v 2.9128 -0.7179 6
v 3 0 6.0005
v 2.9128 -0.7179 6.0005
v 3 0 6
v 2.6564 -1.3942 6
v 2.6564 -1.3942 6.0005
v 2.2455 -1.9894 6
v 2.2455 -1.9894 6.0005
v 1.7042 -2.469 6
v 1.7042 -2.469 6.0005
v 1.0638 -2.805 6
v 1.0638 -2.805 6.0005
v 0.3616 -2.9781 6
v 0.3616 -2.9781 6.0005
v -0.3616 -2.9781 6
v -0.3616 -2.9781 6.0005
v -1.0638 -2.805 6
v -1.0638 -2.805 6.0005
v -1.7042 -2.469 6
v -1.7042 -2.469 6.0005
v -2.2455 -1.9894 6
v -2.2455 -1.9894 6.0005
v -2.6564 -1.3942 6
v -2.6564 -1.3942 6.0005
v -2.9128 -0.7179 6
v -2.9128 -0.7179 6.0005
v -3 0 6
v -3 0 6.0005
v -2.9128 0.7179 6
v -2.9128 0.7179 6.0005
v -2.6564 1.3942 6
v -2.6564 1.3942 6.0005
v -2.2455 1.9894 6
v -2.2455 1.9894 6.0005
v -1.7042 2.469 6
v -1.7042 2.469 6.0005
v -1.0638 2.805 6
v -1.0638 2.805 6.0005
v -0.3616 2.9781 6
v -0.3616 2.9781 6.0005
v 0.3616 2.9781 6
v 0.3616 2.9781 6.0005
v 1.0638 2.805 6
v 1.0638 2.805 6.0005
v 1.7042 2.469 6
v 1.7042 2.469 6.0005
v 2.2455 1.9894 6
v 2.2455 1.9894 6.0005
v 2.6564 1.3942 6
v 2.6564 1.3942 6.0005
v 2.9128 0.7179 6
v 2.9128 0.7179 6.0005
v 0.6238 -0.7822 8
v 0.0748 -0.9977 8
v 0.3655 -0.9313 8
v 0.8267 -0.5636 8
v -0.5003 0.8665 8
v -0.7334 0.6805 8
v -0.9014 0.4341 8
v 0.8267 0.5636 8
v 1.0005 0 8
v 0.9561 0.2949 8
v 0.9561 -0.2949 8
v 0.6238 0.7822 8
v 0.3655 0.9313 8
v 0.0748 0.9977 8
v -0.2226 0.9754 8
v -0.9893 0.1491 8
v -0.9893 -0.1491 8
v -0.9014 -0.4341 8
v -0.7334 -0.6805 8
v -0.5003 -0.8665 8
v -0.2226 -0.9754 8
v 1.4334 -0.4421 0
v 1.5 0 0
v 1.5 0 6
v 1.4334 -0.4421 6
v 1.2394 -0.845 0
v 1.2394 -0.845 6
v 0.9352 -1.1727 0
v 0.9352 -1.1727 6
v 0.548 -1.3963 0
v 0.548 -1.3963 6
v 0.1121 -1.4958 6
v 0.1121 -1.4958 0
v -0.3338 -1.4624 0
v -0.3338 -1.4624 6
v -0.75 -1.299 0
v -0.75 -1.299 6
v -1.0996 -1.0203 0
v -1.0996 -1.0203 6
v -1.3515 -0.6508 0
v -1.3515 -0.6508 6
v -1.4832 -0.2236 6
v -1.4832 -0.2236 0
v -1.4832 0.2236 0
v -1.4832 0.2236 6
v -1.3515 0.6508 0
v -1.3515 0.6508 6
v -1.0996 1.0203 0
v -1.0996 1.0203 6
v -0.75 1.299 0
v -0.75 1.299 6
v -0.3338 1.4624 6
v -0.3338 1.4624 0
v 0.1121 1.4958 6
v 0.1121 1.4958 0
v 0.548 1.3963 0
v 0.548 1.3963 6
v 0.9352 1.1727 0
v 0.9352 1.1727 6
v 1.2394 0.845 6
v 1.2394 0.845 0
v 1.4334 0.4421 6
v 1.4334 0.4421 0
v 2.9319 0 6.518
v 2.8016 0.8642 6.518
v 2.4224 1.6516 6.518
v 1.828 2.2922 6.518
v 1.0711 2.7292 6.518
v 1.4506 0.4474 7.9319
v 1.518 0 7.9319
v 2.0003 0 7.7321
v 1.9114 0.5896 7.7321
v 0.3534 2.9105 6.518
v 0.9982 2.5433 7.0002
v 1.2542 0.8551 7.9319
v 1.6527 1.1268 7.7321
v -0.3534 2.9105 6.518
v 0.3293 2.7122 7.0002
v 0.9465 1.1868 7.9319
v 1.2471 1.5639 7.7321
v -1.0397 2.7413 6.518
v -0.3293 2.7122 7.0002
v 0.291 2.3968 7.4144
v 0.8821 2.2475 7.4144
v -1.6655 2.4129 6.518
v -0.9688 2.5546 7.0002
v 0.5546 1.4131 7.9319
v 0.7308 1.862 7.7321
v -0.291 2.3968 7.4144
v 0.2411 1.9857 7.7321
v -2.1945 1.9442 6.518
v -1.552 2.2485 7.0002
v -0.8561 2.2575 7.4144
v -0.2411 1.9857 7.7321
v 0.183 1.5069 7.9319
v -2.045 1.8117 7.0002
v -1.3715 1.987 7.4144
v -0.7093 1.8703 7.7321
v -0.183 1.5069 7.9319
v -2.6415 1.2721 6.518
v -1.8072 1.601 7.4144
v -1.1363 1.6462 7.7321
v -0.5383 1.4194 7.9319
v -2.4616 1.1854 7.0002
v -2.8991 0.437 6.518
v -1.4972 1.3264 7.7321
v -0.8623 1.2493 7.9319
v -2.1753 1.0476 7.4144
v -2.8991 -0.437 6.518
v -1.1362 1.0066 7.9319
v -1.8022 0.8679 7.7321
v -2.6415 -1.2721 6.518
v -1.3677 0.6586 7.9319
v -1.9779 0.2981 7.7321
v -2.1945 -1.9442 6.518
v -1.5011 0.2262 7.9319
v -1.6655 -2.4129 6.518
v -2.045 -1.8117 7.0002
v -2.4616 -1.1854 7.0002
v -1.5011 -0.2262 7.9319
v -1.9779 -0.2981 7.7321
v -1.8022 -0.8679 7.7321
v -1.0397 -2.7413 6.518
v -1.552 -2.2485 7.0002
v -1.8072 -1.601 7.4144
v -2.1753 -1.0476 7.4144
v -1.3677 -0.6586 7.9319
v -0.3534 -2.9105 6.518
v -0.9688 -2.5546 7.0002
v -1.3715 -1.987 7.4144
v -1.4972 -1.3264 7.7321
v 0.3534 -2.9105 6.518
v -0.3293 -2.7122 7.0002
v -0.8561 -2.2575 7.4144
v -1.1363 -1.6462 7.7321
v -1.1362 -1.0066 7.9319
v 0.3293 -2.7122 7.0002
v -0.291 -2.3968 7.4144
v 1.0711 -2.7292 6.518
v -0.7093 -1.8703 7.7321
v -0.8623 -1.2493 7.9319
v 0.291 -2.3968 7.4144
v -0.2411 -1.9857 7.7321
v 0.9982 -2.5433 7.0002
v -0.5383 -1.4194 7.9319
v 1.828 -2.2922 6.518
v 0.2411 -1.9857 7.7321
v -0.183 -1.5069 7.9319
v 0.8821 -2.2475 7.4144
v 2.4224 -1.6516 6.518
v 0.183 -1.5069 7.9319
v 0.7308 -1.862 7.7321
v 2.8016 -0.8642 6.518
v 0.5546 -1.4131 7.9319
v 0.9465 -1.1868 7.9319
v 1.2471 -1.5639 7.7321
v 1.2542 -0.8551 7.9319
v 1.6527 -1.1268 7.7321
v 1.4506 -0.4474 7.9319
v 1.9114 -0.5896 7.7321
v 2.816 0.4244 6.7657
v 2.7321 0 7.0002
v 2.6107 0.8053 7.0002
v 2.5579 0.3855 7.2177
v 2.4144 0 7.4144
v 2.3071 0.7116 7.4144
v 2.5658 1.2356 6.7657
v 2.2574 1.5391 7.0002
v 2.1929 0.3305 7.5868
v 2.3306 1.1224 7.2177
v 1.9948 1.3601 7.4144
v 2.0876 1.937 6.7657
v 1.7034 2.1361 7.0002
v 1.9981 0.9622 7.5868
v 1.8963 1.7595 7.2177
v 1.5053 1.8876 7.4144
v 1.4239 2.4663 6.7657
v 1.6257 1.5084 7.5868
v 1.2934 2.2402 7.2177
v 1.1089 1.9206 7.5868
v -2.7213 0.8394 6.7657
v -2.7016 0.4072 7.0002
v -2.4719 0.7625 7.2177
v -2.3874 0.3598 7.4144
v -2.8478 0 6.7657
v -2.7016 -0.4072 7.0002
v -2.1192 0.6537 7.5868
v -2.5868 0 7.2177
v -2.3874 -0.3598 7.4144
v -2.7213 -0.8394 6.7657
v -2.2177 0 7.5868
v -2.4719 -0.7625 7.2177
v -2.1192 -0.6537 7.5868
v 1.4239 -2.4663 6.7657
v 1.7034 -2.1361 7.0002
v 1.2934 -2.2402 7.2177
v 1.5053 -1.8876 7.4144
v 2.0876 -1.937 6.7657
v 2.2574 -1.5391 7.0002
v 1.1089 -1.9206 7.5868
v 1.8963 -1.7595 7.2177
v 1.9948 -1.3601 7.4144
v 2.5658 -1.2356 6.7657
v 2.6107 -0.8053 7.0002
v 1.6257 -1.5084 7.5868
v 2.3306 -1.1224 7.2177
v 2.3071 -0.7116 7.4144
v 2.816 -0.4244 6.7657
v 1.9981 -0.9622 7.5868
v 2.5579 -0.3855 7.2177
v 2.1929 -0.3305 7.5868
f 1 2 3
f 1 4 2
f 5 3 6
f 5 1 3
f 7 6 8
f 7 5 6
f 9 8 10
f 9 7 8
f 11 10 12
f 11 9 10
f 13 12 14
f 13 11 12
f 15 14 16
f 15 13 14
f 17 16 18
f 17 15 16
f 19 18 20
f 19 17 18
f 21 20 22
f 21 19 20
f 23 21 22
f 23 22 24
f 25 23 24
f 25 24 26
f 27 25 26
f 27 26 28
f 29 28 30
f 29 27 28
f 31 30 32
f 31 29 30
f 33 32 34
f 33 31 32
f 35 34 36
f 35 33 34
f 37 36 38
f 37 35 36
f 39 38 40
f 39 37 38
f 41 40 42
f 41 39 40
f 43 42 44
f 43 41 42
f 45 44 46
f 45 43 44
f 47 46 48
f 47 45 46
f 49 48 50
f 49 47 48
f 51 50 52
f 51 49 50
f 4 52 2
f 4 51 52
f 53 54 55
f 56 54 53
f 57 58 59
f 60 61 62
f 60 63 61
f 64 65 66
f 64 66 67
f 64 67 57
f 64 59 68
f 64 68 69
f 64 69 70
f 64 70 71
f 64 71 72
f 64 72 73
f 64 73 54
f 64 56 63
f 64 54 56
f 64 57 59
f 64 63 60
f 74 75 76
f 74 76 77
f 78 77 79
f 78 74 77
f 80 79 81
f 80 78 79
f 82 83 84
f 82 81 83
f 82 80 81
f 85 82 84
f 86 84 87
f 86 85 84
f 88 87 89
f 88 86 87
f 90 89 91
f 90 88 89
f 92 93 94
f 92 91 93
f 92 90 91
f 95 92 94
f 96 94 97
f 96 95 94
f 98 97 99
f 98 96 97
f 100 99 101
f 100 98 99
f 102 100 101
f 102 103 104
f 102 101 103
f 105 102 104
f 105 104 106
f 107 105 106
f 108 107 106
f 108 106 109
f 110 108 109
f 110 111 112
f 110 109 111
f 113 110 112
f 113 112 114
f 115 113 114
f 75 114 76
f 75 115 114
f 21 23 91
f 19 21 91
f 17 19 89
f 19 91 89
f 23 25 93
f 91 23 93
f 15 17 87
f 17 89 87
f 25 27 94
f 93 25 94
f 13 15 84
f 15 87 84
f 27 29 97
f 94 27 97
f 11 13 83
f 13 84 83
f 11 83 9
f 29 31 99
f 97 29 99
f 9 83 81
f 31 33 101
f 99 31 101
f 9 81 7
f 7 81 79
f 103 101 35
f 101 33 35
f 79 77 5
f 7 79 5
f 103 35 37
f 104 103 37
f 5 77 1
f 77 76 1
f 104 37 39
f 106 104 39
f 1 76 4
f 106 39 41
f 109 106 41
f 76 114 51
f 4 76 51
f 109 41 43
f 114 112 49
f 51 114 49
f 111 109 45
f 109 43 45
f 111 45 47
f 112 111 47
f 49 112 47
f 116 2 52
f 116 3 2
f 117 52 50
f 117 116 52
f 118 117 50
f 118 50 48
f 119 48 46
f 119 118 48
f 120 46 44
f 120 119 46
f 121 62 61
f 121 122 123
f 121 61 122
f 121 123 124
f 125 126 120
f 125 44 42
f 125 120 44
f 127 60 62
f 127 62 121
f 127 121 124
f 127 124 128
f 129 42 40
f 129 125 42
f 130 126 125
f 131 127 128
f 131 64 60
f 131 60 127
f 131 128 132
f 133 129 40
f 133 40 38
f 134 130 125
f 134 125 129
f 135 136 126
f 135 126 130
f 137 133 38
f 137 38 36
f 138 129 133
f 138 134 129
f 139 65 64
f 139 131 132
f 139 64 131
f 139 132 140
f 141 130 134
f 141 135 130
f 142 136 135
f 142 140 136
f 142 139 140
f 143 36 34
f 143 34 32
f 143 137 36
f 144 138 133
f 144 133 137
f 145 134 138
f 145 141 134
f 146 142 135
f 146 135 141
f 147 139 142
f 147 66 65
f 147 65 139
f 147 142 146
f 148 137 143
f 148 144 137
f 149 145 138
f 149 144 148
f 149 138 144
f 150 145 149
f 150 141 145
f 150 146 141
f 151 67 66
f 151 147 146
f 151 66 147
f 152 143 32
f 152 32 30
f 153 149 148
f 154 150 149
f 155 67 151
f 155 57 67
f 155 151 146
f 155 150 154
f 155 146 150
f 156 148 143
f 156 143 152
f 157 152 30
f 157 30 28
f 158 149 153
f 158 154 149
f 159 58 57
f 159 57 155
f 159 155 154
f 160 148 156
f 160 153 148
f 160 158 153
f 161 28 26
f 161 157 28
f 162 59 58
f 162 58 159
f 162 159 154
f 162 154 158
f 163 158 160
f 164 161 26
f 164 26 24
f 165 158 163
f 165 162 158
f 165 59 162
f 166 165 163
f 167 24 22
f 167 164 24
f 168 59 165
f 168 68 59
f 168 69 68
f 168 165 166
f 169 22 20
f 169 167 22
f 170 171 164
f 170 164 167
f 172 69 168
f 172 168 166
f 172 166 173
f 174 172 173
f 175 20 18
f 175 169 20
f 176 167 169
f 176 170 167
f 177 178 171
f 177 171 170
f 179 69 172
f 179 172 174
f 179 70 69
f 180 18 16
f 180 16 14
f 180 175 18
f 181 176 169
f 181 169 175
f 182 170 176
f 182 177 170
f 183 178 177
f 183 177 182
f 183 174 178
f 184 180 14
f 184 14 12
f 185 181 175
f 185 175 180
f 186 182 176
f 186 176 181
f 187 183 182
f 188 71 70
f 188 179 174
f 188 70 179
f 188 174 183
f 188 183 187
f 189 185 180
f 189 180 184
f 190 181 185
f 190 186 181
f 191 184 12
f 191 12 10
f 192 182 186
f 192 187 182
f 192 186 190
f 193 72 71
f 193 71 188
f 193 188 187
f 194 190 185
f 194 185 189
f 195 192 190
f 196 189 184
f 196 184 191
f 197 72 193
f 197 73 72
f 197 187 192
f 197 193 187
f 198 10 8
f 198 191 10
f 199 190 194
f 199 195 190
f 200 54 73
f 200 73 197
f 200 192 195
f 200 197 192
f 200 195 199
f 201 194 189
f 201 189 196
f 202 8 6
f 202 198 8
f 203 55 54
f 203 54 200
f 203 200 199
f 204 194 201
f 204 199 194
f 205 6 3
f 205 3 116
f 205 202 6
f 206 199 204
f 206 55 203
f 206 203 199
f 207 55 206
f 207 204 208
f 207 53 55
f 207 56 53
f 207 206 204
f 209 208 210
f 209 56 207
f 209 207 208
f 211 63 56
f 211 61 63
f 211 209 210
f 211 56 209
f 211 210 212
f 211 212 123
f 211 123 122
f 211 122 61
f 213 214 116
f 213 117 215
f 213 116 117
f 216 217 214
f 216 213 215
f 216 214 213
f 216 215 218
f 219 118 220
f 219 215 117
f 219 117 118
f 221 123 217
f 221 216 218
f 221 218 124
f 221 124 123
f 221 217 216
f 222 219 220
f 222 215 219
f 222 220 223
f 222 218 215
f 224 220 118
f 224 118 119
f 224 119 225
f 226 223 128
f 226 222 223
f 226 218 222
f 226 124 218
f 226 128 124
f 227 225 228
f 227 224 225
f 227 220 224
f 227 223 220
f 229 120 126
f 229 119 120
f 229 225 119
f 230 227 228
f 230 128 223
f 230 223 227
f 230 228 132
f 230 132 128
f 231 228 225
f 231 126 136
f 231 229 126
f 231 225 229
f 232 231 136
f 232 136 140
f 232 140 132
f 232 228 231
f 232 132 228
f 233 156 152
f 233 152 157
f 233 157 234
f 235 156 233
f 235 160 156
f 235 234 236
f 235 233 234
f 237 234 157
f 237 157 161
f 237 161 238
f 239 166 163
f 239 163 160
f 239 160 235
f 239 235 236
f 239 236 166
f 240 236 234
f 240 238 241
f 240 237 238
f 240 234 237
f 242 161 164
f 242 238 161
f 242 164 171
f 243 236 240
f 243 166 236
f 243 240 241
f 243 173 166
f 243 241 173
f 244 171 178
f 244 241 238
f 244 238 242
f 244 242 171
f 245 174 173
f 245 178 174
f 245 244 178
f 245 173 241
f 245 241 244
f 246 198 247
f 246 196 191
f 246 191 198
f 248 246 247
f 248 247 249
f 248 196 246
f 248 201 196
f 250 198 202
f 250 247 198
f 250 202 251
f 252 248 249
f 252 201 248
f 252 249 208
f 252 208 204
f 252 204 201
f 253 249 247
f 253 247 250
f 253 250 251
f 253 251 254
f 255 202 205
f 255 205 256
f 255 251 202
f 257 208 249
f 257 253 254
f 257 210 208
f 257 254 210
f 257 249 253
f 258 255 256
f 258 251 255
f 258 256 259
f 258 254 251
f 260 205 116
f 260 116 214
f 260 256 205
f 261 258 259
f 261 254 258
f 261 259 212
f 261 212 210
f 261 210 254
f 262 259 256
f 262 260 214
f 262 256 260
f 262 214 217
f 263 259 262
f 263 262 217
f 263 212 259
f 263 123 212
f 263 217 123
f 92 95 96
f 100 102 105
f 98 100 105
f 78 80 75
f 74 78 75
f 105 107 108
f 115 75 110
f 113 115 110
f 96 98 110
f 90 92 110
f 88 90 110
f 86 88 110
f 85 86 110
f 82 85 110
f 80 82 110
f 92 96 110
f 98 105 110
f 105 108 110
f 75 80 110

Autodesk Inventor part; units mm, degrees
ref_plane "YZ Plane" through (0, 0, 0) normal (1, 0, 0) x (0, 1, 0)
ref_plane "XZ Plane" through (0, 0, 0) normal (0, 1, 0) x (-1, 0, 0)
ref_plane "XY Plane" through (0, 0, 0) normal (0, 0, 1) x (1, 0, 0)
sketch "スケッチ1" plane through (0, 0, 0) normal (0, 0, 1) x (1, 0, 0)
  circle A0 centre (0, 0) radius 1.5
  dimension "d0" = 3
extrude "押し出し1" add sketch "スケッチ1" along normal blind 6
sketch "スケッチ2" plane through (0, 0, 6) normal (0, 0, 1) x (1, 0, 0)
  circle A0 centre (0, 0) radius 1.5 projected
  circle A1 centre (0, 0) radius 3
  dimension "d3" = 6
extrude "押し出し2" add sketch "スケッチ2" along normal blind 2 contours A0 | A1
fillet "フィレット1" radius 2 1 edges at (-3, 0, 8)
thread "ねじ1" size "M3x0.5" class "6g" standard "ANSI Metric M Profile" full length
properties part number "SB　6mmなべネジ" material "Steel, Mild"
